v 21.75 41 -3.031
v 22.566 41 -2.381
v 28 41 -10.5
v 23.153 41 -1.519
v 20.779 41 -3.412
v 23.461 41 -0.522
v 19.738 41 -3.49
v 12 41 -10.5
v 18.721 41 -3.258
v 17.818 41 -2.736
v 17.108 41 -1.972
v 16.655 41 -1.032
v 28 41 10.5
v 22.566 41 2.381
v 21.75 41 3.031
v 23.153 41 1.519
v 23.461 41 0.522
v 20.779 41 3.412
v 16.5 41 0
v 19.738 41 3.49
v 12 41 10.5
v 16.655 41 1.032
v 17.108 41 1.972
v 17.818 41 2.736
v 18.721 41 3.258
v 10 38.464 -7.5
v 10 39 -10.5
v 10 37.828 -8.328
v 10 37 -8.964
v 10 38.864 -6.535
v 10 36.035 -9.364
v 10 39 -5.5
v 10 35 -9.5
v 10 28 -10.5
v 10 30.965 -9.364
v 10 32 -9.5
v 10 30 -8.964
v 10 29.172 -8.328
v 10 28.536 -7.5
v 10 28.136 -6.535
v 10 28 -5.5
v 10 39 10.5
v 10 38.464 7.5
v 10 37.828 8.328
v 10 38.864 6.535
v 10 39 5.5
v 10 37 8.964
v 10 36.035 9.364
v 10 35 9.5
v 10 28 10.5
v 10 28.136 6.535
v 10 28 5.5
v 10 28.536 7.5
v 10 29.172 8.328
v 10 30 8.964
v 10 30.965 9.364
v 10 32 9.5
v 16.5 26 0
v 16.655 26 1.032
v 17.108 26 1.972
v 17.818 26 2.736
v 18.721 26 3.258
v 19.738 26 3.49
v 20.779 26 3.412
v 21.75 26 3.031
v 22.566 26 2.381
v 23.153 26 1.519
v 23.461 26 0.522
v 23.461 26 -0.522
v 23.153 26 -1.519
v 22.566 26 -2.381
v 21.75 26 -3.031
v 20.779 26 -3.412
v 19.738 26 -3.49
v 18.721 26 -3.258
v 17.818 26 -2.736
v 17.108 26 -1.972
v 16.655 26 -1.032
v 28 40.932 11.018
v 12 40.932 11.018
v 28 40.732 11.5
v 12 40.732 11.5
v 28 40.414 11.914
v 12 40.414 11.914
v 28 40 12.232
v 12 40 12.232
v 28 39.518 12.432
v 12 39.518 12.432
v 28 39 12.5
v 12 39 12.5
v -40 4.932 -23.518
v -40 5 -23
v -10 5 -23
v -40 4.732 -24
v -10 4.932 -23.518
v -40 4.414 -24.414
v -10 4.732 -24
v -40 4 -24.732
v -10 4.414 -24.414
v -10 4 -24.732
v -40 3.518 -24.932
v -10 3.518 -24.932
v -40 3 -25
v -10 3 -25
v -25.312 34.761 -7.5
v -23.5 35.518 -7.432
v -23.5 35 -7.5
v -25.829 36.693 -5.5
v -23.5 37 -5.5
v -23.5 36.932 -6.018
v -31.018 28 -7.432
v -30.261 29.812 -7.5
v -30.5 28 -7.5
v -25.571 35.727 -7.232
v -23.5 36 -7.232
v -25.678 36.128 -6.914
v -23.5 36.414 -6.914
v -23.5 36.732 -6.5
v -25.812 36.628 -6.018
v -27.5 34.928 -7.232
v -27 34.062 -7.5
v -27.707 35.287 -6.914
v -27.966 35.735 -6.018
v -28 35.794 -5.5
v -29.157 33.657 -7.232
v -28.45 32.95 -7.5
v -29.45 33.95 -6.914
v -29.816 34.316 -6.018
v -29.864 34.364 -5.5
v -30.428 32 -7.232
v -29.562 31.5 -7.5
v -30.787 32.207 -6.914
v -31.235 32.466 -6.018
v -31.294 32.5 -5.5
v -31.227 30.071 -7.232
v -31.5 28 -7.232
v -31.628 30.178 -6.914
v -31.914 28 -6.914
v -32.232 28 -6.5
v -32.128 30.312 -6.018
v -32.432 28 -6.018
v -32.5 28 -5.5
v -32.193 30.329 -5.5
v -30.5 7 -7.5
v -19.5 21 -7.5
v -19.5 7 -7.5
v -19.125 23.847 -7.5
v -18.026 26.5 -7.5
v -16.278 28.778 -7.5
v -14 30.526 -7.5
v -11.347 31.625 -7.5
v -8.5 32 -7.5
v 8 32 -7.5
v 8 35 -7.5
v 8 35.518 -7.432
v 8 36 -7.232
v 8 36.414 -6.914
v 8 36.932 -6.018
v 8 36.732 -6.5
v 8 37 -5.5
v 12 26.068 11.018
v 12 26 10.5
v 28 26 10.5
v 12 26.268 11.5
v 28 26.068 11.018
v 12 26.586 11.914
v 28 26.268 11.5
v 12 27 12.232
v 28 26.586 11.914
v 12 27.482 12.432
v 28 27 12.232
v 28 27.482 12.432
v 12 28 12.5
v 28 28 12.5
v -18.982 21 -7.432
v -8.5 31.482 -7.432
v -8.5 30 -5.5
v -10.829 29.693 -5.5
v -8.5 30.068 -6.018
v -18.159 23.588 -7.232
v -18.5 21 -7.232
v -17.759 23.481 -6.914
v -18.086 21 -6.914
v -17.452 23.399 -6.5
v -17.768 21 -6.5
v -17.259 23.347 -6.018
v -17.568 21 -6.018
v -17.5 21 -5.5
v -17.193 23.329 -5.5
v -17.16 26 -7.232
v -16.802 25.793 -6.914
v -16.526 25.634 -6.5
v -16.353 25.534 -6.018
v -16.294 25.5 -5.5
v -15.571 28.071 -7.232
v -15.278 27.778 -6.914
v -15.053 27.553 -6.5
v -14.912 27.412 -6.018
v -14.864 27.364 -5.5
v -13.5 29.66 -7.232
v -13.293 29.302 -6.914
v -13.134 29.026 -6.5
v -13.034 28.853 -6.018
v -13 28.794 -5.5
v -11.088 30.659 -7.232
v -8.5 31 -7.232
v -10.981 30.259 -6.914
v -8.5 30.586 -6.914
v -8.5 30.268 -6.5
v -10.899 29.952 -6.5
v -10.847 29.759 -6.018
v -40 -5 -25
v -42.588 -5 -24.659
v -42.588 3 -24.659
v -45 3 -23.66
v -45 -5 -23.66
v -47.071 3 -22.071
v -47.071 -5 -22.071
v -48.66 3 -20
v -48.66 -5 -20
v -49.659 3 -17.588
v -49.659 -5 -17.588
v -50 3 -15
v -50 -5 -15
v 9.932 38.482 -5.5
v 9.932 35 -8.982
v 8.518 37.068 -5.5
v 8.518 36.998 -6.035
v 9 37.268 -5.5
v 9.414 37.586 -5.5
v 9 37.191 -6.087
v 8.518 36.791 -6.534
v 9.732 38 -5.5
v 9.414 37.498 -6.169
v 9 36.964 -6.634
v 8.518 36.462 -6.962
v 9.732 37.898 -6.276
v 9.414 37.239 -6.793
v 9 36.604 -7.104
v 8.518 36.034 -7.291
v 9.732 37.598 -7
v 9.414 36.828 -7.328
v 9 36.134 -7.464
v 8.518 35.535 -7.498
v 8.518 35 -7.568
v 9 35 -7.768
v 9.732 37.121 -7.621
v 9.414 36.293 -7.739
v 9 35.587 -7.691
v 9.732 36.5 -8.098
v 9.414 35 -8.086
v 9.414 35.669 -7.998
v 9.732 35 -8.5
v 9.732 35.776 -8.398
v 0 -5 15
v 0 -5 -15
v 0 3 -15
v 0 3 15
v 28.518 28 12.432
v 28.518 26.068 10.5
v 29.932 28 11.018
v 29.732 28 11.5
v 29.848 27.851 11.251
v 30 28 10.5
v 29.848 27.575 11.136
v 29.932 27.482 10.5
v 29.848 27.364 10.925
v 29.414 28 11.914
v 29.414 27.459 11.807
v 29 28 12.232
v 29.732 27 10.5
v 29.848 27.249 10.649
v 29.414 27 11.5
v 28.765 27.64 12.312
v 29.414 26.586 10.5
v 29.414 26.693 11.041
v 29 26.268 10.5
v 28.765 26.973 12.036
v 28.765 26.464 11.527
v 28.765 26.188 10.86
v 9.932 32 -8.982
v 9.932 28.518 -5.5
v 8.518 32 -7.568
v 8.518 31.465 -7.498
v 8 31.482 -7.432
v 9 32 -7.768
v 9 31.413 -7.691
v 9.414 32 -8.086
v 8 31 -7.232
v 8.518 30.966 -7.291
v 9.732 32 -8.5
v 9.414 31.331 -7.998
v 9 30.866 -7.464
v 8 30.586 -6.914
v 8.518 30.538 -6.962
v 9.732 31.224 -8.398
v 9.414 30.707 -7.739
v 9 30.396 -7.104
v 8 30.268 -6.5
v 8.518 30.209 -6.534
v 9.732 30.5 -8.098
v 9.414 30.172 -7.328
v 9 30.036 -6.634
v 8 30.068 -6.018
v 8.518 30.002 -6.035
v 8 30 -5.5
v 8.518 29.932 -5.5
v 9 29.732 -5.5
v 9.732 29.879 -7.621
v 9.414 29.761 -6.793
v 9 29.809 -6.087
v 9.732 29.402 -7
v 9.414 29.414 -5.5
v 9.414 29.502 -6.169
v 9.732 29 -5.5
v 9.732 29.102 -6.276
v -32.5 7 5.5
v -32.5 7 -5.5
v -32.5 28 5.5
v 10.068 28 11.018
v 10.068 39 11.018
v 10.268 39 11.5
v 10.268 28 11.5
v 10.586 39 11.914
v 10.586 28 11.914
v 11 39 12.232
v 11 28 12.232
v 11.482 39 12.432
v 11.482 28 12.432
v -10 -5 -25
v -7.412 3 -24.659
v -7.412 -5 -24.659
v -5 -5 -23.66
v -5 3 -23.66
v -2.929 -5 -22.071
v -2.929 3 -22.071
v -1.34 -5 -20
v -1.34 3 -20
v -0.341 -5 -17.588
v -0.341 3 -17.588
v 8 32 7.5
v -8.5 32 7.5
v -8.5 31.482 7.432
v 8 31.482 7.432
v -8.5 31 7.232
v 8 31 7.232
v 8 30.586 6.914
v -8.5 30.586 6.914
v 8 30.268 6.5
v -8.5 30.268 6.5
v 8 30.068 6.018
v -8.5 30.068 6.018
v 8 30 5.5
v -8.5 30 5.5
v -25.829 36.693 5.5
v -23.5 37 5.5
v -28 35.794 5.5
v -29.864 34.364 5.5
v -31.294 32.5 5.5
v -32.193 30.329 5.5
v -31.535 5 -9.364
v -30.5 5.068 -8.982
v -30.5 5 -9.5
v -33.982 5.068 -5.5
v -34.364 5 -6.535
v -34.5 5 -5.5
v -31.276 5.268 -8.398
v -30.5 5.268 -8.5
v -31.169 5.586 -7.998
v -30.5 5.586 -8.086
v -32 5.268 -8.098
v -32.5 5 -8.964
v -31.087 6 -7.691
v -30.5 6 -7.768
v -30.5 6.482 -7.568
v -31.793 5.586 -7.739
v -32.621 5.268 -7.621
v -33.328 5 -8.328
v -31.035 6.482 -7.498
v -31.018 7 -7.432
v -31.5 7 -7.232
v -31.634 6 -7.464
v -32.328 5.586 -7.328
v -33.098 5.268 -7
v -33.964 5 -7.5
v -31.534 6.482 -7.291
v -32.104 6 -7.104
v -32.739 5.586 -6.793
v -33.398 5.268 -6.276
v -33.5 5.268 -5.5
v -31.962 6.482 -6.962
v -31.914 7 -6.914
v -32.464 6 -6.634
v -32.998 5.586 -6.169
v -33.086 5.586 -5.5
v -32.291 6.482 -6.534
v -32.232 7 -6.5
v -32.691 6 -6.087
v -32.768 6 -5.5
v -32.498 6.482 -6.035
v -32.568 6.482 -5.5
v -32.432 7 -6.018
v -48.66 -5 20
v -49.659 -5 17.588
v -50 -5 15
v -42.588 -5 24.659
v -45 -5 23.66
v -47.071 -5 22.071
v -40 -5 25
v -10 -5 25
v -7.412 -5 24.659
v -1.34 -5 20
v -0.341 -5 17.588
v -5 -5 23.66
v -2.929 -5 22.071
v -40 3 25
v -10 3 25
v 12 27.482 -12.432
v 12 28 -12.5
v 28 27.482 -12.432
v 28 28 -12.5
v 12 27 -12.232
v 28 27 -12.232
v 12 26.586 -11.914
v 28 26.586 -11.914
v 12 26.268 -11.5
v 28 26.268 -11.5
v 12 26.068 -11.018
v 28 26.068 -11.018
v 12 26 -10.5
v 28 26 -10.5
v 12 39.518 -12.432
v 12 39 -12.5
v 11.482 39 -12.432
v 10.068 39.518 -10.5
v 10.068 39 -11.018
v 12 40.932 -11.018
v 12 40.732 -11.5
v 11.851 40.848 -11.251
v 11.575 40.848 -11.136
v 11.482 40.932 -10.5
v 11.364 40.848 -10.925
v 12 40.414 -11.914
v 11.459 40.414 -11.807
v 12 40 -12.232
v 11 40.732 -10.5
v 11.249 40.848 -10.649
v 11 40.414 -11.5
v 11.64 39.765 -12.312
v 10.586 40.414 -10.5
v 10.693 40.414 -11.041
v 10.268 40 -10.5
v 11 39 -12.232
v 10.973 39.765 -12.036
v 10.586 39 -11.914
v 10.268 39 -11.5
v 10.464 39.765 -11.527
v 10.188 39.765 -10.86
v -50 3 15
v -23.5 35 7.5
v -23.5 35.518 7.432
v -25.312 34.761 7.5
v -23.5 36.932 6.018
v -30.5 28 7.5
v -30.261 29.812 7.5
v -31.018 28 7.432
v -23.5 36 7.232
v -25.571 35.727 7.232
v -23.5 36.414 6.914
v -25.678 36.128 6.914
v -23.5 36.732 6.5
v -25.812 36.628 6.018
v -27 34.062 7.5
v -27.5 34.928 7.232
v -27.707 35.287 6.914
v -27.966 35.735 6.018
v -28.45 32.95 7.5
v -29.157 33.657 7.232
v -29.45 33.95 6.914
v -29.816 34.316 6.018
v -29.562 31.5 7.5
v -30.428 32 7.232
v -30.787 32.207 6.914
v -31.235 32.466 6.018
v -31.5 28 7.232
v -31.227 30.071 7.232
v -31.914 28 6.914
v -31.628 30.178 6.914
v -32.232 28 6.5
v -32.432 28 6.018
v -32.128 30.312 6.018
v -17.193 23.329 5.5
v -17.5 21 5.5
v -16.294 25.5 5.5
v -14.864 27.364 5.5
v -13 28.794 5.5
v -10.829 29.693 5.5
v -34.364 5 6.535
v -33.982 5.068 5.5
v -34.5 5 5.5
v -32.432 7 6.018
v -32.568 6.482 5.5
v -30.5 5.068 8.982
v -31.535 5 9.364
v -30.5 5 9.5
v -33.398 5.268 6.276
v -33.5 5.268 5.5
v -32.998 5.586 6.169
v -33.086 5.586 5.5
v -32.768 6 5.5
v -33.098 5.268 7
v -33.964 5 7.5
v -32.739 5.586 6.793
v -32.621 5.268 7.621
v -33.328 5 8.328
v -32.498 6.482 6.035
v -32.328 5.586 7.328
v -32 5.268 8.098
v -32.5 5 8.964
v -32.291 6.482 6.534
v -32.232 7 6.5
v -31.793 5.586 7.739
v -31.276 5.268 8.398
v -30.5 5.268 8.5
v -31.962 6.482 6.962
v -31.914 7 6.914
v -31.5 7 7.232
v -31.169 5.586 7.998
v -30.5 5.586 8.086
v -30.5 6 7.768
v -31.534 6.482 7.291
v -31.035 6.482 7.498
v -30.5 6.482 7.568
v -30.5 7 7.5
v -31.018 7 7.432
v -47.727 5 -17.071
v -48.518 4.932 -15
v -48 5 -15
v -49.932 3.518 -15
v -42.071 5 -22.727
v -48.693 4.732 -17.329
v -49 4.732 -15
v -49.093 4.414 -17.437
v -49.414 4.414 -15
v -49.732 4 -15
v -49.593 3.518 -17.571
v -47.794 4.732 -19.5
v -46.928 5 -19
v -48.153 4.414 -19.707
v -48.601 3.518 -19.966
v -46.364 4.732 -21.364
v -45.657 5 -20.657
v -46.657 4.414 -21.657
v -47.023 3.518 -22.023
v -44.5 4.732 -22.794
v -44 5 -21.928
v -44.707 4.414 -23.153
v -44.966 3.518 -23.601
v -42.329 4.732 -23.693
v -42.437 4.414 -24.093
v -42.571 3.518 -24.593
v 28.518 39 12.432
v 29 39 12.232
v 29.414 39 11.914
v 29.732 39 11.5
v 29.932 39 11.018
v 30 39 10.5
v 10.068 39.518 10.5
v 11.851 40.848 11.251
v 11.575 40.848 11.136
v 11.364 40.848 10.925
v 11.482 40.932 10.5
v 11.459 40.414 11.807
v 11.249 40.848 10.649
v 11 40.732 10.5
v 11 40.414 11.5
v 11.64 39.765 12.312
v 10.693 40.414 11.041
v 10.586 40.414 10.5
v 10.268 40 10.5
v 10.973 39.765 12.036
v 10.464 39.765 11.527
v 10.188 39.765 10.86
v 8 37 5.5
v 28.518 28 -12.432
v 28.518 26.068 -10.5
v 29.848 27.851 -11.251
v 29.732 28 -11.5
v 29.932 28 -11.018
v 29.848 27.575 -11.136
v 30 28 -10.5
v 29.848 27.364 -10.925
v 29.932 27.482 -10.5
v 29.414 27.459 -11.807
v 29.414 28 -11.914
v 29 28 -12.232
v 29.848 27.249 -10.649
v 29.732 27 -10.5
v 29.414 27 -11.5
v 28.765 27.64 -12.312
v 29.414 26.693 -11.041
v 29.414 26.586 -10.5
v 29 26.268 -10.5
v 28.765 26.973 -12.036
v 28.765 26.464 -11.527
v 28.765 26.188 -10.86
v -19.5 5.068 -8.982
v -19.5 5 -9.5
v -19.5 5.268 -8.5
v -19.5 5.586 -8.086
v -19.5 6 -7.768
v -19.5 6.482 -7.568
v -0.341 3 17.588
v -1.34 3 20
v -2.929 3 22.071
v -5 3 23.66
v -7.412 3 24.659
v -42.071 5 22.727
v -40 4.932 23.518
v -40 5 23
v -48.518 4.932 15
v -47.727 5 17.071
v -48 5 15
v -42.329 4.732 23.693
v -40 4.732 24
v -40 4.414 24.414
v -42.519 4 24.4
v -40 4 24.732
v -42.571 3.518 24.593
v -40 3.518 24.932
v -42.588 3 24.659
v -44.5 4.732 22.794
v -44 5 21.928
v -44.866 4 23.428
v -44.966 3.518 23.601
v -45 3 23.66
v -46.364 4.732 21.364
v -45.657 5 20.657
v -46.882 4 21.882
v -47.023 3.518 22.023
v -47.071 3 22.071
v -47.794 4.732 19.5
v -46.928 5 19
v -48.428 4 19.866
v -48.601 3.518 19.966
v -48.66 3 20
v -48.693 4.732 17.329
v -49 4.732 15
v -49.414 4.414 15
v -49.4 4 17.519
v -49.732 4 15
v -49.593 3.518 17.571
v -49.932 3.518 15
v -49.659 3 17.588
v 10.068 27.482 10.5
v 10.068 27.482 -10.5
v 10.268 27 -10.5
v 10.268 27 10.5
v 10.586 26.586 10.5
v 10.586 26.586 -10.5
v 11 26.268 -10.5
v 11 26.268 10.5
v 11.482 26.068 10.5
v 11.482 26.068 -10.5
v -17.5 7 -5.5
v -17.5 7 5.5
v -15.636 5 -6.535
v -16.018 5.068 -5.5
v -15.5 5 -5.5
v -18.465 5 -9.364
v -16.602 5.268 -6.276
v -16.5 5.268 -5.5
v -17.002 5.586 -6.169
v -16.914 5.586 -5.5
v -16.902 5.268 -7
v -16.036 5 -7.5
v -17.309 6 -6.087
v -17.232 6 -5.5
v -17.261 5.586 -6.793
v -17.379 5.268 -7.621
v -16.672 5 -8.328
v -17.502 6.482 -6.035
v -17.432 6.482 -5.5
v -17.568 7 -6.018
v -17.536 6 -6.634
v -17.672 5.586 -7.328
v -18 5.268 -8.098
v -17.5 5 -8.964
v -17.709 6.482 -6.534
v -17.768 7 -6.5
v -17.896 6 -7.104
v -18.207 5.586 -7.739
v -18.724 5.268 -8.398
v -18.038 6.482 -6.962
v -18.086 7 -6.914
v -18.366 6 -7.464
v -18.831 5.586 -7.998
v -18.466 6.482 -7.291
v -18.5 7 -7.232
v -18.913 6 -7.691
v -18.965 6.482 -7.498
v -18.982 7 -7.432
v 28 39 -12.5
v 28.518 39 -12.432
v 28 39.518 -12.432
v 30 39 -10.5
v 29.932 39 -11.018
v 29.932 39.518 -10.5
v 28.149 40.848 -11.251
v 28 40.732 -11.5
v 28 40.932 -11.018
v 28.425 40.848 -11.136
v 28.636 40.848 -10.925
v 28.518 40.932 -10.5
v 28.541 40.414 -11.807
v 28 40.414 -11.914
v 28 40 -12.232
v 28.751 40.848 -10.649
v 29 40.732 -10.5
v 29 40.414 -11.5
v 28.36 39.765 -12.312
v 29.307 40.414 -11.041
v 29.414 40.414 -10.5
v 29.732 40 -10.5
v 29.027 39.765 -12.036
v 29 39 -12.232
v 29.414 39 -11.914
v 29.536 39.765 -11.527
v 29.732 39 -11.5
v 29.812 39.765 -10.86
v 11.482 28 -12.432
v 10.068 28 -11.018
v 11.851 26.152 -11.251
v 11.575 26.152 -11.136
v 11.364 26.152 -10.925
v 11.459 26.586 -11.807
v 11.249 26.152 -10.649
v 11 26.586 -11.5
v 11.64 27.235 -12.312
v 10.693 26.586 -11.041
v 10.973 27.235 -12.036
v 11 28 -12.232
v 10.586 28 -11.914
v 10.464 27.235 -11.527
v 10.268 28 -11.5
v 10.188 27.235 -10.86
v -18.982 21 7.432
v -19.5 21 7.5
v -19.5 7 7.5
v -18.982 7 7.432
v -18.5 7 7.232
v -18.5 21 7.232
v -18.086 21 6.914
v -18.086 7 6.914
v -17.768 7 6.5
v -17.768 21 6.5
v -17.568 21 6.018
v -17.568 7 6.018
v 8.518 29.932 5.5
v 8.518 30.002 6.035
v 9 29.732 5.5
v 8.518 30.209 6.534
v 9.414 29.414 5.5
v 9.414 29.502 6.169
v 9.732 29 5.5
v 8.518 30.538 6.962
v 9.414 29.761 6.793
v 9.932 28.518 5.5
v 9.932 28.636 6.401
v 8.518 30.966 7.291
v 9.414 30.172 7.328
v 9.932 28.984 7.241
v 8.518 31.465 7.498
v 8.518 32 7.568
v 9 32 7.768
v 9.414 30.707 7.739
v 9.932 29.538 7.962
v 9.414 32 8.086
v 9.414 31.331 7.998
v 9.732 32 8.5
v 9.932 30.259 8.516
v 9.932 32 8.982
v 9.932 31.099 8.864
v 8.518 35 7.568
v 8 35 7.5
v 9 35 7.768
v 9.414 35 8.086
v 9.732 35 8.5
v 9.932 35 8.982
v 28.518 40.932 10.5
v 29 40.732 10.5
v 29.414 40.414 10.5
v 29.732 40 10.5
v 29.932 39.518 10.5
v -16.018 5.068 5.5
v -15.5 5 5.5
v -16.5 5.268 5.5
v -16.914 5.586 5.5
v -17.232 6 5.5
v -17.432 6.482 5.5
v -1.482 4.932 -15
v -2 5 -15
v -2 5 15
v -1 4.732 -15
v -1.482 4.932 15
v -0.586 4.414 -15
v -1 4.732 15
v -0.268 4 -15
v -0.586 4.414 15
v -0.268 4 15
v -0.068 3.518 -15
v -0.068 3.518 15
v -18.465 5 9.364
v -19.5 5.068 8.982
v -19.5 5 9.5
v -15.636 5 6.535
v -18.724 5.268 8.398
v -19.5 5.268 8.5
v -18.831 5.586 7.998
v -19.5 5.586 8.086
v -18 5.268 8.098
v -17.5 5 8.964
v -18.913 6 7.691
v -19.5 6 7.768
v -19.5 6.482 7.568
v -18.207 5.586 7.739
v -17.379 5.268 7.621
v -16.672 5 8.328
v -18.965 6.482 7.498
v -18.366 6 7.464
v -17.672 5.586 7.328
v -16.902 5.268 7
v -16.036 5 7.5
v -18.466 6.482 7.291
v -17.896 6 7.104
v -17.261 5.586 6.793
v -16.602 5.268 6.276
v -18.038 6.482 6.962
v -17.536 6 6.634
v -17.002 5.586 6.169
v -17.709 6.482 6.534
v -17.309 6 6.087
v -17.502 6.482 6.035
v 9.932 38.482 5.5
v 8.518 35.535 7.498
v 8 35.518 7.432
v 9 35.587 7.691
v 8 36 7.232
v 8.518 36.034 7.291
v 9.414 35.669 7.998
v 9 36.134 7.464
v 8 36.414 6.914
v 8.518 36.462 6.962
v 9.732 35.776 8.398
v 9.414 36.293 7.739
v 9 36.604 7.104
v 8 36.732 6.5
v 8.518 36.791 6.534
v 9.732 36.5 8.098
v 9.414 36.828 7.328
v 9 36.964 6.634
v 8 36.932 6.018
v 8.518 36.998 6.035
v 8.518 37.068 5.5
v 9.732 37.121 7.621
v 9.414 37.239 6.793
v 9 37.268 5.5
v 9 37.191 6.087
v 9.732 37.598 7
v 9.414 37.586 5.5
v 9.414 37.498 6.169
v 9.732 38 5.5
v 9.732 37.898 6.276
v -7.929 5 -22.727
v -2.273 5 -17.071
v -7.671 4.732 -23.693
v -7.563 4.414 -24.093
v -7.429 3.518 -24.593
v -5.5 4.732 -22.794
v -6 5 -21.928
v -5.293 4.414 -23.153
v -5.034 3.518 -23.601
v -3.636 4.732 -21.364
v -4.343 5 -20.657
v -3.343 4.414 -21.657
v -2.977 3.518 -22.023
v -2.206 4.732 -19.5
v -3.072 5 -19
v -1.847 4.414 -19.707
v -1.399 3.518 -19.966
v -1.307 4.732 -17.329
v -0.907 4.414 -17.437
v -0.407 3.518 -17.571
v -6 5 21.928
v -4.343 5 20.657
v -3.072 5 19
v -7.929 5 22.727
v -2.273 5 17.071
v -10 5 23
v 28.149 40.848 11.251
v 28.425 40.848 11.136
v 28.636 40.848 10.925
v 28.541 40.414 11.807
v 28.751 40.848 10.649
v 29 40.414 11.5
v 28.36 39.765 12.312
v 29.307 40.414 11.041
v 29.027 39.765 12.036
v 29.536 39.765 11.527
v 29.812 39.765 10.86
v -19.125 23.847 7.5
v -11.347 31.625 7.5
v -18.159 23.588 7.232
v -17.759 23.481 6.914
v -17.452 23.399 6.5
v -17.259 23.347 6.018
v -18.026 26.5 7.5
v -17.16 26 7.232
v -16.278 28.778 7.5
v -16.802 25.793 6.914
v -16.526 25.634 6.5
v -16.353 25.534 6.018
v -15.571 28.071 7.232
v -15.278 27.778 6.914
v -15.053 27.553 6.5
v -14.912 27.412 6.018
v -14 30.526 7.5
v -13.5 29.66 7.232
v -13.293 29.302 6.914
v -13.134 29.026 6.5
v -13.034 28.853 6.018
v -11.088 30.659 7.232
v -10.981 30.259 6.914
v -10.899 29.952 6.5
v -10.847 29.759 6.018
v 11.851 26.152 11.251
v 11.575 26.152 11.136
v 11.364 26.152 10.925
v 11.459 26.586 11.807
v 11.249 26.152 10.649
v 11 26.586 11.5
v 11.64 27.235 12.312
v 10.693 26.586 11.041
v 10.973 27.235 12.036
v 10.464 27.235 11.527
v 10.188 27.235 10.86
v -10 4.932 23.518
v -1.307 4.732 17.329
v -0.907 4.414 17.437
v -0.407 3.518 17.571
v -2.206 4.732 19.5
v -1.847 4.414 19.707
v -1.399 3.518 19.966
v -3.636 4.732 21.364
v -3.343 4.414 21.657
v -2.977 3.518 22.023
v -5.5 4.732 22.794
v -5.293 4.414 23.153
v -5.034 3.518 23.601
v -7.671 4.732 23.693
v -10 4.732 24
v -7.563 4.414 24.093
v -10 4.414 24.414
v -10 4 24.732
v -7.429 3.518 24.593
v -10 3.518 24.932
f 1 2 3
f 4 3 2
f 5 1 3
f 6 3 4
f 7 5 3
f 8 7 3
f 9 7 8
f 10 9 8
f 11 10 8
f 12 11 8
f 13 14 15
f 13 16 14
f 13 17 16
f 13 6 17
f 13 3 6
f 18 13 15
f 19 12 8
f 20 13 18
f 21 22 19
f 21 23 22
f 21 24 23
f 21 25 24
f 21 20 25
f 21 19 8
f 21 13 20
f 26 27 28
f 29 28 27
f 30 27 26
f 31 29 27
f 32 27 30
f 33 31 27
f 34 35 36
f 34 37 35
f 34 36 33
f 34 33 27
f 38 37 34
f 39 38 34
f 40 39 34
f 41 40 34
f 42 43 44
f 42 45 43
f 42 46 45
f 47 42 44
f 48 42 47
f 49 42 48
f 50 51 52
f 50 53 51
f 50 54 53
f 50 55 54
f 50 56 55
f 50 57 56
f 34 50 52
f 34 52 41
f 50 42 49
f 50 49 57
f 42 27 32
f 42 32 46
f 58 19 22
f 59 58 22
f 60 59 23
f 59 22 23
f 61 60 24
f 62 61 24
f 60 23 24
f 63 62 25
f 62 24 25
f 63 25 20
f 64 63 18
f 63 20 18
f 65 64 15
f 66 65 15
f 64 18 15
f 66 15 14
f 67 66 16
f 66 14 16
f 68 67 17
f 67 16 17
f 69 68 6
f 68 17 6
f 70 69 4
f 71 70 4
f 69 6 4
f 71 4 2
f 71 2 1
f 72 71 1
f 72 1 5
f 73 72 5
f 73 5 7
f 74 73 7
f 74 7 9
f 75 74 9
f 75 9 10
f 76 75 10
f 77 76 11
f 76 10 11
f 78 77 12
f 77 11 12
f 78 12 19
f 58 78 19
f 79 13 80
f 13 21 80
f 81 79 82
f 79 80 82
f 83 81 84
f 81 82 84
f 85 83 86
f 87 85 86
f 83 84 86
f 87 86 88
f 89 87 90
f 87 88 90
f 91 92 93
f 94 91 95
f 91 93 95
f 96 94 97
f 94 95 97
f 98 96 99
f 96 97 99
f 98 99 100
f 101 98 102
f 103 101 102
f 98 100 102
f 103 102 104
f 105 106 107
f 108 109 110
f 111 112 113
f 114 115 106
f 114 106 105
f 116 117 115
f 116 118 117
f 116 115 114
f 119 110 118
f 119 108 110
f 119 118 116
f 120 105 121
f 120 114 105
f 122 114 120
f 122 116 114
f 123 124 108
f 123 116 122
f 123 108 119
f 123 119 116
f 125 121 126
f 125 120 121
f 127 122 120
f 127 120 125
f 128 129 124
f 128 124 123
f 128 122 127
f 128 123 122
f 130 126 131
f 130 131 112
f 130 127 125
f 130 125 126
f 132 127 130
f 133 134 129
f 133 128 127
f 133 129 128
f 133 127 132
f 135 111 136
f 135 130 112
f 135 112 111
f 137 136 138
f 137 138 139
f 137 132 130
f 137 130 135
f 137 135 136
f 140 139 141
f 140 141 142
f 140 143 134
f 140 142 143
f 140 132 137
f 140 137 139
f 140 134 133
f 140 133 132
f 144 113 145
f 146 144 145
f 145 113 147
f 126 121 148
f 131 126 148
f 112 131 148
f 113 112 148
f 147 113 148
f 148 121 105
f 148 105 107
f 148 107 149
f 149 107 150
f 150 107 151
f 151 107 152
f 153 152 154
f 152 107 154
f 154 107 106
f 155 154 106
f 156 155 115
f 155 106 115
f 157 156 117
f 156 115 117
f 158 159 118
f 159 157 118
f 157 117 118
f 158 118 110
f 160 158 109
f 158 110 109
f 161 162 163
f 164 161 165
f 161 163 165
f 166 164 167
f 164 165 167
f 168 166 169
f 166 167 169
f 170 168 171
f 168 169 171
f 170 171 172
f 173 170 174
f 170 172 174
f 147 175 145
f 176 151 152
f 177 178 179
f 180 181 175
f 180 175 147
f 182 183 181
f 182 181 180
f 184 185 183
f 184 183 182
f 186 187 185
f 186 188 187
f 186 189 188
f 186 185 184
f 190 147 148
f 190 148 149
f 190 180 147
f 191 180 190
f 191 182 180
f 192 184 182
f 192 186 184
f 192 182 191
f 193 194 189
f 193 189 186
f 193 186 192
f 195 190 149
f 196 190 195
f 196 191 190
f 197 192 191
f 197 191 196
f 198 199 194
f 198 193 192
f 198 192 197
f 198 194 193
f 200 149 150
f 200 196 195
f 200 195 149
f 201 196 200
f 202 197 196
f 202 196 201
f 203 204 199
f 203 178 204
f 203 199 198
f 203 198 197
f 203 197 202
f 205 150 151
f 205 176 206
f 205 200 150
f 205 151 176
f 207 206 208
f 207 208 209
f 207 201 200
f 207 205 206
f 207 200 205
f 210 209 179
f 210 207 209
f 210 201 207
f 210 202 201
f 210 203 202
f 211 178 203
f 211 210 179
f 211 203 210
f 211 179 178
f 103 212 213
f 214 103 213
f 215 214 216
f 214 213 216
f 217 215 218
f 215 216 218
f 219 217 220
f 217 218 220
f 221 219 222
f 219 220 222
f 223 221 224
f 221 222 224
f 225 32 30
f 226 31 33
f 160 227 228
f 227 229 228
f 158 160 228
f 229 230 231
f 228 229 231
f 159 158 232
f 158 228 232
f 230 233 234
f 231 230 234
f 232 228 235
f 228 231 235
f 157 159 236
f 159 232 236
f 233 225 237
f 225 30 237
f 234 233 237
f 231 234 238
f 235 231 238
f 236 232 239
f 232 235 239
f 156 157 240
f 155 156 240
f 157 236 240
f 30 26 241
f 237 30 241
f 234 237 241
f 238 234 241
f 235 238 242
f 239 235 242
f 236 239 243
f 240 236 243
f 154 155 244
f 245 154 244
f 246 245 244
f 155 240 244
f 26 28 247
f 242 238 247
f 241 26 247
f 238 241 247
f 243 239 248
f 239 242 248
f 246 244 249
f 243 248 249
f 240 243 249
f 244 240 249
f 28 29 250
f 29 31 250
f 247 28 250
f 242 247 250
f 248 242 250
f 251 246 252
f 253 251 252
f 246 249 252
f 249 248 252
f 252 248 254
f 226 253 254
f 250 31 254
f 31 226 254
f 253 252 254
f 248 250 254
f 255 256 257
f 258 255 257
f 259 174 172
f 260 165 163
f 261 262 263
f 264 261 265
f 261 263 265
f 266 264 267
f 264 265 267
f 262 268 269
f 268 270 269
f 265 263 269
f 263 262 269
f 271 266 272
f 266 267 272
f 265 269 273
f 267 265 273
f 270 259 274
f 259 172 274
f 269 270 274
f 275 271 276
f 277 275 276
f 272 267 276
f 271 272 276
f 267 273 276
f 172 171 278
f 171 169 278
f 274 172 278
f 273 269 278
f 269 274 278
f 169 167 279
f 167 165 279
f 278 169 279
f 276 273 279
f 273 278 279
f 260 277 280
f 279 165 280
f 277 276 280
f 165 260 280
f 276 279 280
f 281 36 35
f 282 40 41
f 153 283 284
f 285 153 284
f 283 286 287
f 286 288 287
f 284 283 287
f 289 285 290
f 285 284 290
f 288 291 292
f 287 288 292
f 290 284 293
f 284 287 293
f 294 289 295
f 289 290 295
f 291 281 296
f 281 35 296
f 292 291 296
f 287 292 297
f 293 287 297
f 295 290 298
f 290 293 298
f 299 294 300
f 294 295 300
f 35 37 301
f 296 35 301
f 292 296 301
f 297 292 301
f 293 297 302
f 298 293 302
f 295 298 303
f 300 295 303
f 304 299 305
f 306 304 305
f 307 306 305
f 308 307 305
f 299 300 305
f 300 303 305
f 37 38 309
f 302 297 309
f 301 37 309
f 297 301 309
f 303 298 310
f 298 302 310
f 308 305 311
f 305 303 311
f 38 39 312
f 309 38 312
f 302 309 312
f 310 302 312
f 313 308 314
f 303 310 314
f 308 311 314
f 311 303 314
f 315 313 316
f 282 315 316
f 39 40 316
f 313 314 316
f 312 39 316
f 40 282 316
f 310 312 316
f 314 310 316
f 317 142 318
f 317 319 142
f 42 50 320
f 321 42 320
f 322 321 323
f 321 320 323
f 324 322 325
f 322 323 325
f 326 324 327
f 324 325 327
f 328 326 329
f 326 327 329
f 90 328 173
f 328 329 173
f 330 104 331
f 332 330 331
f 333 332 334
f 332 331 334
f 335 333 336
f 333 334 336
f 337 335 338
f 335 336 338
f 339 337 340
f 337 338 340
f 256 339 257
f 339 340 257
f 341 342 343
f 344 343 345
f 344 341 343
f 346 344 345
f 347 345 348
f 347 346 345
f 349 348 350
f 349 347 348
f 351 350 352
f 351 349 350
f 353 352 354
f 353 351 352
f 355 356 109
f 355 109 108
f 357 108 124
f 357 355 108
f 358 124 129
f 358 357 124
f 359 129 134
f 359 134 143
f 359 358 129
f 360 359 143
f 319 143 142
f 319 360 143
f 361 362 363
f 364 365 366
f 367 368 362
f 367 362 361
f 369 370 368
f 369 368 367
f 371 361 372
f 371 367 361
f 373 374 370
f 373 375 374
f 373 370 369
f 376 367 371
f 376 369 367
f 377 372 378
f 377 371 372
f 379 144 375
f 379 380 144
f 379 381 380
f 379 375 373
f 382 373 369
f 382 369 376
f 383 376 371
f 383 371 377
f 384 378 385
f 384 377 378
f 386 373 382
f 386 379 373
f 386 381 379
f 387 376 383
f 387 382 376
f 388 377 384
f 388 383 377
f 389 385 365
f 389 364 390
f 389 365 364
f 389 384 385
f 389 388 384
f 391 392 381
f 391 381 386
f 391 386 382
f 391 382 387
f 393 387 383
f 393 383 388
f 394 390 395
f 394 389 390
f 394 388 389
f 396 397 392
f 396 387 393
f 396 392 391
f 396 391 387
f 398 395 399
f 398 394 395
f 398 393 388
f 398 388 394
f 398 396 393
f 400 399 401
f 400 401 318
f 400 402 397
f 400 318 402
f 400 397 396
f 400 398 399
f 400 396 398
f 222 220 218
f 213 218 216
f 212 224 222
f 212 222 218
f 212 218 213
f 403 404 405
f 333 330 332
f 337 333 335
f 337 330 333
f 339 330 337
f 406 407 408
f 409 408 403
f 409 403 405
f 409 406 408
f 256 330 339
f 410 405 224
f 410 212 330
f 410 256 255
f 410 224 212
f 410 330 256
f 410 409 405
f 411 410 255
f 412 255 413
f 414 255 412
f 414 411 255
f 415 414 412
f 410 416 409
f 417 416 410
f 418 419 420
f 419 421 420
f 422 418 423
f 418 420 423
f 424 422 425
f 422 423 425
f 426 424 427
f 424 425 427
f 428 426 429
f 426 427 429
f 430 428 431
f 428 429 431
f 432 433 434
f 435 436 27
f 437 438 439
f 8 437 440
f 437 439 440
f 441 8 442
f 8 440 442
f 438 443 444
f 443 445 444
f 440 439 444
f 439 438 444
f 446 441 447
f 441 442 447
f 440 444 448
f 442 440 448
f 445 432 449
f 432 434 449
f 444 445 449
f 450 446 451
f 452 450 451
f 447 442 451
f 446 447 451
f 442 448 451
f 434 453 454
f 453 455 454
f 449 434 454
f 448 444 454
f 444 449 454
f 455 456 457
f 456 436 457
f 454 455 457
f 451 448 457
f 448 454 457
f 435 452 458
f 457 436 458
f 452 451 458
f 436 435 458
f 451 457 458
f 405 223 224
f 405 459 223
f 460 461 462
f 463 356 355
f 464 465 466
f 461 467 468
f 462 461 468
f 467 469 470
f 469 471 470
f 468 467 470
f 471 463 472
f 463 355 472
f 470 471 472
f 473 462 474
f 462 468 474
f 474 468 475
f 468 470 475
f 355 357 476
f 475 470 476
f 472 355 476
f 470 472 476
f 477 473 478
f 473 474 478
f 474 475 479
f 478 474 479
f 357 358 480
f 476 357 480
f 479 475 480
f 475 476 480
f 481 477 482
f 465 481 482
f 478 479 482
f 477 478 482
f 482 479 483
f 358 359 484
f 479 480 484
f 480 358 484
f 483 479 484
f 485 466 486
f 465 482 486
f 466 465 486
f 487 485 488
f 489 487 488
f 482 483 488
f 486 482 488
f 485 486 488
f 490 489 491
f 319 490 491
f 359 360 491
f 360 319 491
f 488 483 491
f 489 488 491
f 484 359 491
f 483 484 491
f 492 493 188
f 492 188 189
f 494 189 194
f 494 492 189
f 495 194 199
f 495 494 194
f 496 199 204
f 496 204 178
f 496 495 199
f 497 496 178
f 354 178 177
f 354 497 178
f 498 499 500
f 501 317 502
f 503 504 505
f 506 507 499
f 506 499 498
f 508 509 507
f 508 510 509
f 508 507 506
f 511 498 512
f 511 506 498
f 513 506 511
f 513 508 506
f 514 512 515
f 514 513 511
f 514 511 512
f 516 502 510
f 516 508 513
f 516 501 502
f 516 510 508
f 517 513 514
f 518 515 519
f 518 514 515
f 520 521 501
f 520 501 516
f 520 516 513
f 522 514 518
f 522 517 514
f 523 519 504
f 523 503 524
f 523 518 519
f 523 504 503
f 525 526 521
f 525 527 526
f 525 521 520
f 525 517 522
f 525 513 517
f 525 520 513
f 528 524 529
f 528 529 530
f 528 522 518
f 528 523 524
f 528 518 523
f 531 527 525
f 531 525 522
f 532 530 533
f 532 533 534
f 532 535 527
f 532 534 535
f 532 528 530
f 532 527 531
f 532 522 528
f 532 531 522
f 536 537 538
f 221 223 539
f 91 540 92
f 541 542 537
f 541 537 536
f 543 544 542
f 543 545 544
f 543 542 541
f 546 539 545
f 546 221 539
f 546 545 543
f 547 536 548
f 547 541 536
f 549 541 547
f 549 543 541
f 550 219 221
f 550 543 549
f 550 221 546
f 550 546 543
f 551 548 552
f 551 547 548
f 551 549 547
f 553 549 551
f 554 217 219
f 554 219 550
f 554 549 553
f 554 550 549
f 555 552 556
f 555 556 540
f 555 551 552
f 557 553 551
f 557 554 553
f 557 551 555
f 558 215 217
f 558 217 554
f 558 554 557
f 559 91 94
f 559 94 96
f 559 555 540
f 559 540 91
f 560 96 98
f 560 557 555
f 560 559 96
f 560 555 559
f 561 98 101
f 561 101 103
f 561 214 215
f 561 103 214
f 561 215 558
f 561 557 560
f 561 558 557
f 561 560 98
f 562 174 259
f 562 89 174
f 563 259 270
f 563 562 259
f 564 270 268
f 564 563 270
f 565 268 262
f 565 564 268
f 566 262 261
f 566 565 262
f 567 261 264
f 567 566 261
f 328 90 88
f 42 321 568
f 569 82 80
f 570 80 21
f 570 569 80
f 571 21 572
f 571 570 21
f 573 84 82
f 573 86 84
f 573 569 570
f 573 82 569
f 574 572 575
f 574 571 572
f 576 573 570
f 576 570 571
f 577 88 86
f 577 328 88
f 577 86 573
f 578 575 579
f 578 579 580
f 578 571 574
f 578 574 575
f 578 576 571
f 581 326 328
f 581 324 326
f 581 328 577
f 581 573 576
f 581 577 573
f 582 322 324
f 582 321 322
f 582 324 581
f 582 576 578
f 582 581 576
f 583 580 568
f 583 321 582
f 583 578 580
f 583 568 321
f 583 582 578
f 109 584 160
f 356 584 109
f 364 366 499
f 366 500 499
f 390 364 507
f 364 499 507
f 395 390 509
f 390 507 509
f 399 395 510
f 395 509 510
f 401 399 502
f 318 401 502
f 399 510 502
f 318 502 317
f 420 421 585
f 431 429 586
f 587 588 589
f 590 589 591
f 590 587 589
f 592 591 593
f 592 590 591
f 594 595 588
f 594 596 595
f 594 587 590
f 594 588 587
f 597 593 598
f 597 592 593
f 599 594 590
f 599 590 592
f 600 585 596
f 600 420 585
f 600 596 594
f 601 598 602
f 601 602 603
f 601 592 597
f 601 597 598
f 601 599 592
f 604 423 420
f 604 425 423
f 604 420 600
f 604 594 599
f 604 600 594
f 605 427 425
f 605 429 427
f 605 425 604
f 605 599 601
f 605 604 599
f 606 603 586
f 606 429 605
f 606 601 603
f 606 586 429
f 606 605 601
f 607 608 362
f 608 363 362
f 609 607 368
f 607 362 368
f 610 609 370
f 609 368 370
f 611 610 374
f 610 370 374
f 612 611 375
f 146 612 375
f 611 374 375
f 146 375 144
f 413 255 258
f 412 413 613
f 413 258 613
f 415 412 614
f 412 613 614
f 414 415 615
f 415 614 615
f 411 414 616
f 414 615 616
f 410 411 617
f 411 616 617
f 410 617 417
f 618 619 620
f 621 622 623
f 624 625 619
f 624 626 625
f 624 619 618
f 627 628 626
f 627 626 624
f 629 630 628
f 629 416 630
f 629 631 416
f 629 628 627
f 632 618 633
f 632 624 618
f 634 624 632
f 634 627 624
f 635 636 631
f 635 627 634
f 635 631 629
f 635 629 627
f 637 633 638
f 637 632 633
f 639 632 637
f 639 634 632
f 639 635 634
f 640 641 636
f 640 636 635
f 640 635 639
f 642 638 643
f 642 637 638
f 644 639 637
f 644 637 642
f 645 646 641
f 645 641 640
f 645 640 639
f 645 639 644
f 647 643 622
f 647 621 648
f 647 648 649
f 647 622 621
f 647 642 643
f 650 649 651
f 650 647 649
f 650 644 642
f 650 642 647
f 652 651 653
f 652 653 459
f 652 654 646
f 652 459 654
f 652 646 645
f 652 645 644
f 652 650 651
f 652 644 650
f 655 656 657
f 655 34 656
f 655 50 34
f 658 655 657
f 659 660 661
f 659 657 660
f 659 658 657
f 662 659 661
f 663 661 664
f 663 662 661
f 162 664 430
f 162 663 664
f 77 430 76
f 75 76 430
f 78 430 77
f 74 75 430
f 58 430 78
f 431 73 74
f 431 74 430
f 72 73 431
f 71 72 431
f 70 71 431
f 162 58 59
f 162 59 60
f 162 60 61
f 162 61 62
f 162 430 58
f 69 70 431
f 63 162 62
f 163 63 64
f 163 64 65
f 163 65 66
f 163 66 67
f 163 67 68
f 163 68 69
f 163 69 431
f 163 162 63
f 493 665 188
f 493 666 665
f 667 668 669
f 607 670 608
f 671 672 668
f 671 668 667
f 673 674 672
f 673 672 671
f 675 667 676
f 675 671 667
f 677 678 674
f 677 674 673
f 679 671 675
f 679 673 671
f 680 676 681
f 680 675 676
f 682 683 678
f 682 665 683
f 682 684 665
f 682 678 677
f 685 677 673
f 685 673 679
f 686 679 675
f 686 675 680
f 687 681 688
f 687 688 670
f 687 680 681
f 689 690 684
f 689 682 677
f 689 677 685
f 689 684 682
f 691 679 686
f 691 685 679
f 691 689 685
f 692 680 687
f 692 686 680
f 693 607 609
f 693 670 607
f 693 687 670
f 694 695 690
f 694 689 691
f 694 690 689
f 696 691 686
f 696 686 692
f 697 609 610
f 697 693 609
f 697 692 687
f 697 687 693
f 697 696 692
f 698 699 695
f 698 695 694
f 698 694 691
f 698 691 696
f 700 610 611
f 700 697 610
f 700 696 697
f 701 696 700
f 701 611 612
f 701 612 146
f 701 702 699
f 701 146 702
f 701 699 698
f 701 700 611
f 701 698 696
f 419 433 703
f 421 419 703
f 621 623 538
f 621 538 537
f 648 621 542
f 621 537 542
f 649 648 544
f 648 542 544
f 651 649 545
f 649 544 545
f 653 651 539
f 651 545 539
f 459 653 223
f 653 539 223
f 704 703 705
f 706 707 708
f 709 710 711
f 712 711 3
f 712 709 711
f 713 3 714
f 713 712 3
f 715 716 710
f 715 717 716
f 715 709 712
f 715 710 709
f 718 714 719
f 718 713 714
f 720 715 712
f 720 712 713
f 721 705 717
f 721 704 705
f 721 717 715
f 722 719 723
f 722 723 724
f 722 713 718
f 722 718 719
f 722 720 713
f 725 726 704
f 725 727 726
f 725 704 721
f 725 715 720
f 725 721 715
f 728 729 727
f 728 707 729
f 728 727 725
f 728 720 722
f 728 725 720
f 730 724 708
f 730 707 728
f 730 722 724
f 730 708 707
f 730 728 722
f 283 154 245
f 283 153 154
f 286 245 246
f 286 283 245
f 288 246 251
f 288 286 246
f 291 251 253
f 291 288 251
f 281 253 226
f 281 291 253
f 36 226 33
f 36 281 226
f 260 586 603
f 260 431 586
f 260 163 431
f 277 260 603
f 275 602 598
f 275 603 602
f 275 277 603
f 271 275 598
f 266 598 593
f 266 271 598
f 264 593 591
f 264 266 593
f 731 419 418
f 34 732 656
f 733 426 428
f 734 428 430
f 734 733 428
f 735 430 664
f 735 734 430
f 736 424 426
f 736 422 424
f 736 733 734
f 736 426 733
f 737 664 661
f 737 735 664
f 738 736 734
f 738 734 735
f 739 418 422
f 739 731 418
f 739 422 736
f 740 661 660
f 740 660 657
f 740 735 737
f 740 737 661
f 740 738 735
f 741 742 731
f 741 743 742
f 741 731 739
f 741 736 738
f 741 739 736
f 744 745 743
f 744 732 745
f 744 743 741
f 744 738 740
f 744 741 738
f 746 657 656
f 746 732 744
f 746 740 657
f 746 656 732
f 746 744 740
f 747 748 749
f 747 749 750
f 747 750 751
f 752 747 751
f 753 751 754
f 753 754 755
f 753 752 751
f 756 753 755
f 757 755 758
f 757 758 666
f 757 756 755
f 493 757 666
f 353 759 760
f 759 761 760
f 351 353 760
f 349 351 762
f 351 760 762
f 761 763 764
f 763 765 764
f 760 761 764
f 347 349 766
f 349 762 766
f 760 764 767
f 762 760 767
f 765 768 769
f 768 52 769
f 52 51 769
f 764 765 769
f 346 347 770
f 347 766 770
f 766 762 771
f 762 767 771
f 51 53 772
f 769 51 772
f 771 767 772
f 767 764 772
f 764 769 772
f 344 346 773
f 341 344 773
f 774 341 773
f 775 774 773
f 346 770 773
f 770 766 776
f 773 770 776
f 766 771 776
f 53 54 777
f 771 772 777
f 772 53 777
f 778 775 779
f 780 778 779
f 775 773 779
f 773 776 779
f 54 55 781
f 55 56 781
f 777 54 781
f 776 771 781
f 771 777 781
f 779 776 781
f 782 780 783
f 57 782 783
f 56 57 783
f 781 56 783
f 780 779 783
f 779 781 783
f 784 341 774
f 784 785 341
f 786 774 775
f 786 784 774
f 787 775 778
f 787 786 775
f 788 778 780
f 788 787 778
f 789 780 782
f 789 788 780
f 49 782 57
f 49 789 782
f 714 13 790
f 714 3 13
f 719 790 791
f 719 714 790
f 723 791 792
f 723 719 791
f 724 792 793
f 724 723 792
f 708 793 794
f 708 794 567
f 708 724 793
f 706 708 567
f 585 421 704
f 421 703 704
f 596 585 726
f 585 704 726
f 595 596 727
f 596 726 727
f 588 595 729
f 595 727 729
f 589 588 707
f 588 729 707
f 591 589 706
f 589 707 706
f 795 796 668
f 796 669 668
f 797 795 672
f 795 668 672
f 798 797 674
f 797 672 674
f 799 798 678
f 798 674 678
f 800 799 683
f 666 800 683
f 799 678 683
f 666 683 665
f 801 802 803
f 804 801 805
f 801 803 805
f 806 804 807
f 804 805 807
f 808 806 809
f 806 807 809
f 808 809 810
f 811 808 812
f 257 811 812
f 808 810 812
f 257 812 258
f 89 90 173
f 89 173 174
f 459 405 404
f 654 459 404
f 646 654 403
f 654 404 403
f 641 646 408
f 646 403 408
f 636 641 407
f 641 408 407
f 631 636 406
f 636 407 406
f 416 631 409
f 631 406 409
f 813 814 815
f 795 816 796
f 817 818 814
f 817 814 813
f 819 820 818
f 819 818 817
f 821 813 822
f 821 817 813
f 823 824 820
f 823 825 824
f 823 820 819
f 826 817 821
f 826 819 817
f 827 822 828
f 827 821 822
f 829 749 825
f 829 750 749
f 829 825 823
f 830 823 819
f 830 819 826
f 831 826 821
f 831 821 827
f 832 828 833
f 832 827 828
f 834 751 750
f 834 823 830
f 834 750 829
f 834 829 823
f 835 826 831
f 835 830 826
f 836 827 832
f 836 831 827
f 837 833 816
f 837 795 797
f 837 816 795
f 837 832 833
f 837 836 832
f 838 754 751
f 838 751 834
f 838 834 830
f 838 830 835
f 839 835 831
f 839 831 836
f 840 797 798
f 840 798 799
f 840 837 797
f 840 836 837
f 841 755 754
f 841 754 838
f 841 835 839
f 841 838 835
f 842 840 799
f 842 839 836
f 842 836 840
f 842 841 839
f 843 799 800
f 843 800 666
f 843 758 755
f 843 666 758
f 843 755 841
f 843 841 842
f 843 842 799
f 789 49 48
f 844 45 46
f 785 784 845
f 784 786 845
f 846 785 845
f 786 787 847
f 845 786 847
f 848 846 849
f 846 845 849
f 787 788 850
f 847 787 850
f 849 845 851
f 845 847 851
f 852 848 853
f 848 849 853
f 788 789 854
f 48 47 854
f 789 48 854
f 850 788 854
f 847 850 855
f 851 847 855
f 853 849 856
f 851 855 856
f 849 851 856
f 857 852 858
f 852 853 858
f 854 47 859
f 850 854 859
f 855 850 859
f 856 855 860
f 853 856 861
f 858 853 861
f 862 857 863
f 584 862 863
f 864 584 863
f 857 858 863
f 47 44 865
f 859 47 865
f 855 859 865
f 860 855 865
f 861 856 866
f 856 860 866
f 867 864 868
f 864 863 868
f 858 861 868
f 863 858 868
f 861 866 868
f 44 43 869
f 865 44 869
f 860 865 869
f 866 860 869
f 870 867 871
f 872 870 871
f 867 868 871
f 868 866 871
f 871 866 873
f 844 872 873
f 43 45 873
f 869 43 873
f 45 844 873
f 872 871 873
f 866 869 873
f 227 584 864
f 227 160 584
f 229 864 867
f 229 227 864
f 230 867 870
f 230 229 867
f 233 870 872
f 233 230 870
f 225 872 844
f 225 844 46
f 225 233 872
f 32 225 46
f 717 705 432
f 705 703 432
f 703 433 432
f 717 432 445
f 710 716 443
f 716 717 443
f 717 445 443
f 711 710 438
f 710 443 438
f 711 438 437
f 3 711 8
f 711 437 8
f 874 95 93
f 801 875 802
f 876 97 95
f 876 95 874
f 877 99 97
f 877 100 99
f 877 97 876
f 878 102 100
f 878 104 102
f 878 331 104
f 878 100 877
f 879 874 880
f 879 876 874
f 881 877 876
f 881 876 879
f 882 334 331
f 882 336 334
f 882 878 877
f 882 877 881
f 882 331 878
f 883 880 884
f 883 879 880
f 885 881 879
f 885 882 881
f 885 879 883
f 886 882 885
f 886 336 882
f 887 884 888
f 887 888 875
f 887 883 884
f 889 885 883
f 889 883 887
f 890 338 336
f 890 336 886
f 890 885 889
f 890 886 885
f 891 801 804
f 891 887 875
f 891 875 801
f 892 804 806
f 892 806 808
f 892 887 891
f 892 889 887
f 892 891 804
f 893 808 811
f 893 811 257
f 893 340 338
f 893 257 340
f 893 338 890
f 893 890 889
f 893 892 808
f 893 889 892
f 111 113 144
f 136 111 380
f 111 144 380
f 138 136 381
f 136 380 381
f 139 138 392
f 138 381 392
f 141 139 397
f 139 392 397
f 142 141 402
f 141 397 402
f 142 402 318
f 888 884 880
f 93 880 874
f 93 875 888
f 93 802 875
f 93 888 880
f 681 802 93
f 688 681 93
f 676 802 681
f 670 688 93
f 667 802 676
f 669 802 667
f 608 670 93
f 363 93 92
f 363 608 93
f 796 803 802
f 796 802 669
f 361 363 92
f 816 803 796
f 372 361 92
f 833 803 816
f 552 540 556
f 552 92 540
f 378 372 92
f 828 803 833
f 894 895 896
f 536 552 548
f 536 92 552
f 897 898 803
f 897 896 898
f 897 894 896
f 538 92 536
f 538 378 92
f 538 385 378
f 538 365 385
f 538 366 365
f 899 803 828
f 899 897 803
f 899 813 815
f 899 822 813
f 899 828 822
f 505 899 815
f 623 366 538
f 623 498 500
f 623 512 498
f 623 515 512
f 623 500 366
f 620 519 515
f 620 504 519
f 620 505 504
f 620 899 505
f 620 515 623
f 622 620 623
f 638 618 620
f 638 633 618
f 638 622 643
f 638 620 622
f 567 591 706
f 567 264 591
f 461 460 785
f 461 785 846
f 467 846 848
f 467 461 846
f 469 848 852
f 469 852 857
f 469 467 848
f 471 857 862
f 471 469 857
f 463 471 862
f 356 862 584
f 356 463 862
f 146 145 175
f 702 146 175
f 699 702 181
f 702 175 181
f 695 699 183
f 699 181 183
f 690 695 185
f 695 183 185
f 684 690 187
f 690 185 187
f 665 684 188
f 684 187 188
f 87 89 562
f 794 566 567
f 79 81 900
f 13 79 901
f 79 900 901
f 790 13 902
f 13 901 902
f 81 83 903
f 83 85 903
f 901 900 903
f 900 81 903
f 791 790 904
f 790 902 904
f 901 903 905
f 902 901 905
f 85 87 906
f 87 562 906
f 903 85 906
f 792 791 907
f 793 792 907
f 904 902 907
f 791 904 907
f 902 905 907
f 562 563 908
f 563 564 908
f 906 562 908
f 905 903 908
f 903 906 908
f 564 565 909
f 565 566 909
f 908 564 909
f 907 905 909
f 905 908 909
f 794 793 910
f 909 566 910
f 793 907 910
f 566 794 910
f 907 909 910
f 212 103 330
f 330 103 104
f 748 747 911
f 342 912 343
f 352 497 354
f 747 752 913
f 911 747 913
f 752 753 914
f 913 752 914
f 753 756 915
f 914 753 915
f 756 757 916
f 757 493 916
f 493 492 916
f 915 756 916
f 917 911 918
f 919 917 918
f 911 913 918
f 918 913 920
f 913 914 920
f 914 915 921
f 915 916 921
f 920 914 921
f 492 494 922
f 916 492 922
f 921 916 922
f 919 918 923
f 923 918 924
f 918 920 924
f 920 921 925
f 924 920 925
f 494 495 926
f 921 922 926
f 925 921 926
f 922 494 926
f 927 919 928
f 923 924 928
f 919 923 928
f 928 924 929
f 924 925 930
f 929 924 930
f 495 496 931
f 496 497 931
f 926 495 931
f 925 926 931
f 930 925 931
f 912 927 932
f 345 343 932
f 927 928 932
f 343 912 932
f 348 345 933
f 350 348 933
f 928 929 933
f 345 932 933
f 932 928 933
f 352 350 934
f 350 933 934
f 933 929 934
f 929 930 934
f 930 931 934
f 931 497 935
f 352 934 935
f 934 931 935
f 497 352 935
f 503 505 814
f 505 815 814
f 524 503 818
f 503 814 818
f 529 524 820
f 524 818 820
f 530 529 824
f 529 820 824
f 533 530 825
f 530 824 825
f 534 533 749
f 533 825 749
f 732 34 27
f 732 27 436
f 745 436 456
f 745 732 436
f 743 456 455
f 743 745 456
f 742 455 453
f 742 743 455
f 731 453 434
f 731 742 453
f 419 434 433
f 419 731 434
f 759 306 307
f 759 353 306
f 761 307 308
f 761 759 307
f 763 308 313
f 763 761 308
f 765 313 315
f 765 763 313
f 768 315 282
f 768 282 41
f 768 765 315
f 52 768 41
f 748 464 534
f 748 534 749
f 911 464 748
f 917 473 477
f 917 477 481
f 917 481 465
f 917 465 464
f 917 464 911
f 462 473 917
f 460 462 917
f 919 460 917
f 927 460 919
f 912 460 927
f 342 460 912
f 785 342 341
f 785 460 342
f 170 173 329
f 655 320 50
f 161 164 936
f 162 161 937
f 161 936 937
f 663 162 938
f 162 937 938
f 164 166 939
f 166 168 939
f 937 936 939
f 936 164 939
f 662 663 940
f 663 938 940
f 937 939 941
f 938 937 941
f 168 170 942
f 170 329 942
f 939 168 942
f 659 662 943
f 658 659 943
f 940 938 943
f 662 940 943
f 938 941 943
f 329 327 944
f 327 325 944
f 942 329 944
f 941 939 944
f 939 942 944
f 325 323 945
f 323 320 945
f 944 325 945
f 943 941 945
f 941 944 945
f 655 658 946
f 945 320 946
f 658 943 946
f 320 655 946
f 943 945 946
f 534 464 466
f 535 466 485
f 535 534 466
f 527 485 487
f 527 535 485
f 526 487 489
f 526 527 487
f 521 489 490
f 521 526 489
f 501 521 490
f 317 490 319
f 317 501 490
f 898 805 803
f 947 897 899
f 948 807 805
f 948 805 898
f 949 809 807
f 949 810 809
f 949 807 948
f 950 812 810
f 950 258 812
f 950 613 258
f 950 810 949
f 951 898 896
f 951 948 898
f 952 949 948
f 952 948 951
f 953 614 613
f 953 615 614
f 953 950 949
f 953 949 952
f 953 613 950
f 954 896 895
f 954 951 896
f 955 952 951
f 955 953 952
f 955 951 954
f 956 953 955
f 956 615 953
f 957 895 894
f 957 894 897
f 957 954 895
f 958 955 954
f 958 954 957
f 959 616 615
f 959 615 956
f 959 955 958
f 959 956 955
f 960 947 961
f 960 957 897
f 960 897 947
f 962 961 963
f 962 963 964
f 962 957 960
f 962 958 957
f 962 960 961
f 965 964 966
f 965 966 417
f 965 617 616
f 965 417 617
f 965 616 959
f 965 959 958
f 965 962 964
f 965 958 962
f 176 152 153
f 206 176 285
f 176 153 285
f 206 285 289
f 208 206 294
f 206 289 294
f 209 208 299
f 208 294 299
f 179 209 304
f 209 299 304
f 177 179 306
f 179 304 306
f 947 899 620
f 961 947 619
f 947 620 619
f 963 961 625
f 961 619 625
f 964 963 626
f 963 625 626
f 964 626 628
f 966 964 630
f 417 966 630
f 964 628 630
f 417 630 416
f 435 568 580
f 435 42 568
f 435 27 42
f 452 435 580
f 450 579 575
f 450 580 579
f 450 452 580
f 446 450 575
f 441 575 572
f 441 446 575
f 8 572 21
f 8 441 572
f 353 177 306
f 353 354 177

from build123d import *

# Parameters (mm, degrees)
F1_DEPTH = 25
F2_DEPTH = 7.5
F3_DEPTH = 12.5
F4_R     = 10
F5_F1_R  = 2
F5_F2_R  = 2
F6_R     = 3.5
F7_DEPTH = 15
F8_R     = 1.99999


# Not quite as in the source:
# - a fillet or chamfer is up to 0.001 mm smaller than in the source, because OpenCascade refuses the exact size


with BuildPart() as f1:
    # F0 (on Top) → F1 (new body, symmetric)
    with BuildSketch(Plane.XY):
        Polygon((-32.5, 5), (-50, 5), (-50, -5), (0, -5), (0, 5), (-17.5, 5), align=None)
    extrude(amount=F1_DEPTH, both=True)

    # F0 (on Top) → F2 (join, symmetric)
    with BuildSketch(Plane.XY):
        with BuildLine():
            Line((-32.5, 28), (-32.5, 5))
            Line((-32.5, 5), (-17.5, 5))
            Line((-17.5, 5), (-17.5, 21))
            ThreePointArc((-17.5, 21), (-14.8639610307, 27.3639610307), (-8.5, 30))
            Line((-8.5, 30), (10, 30))
            Line((10, 30), (10, 37))
            Line((10, 37), (-23.5, 37))
            ThreePointArc((-23.5, 37), (-29.8639610307, 34.3639610307), (-32.5, 28))
        make_face()
    extrude(amount=F2_DEPTH, both=True)

    # F0 (on Top) → F3 (join, symmetric)
    with BuildSketch(Plane.XY):
        Polygon((10, 41), (10, 37), (10, 30), (10, 26), (30, 26), (30, 41), align=None)
    extrude(amount=F3_DEPTH, both=True)

    # F4
    f4_edges = [f1.edges().sort_by_distance(p)[0] for p in [
        (-50, 0, 25),
        (0, 0, 25),
        (0, 0, -25),
        (-50, 0, -25),
    ]]
    fillet(f4_edges, radius=F4_R)

    # F5: fillet of radius 2 on 26 edges, made by hand

    # F5_f1
    f5_f1_edges = [f1.edges().sort_by_distance(p)[0] for p in [
        (0.75, 30, 7.5),
        (-6.75, 37, 7.5),
        (-29.8639610307, 34.3639610307, 7.5),
        (-32.5, 16.5, 7.5),
        (-17.5, 13, 7.5),
        (-14.8639610307, 27.3639610307, 7.5),
        (0.75, 30, -7.5),
        (-6.75, 37, -7.5),
        (-29.8639610307, 34.3639610307, -7.5),
        (-32.5, 16.5, -7.5),
        (-17.5, 13, -7.5),
        (-14.8639610307, 27.3639610307, -7.5),
        (-50, 5, 0),
        (-47.0710678119, 5, -22.0710678119),
        (-47.0710678119, 5, 22.0710678119),
        (-25, 5, -25),
        (-25, 5, 25),
        (-2.9289321881, 5, -22.0710678119),
        (-2.9289321881, 5, 22.0710678119),
        (0, 5, 0),
    ]]
    fillet(f5_f1_edges, radius=F5_F1_R)

    # F5_f2
    f5_f2_edges = [f1.edges().sort_by_distance(p)[0] for p in [
        (10, 33.5, 7.5),
        (-25, 5, 7.5),
        (10, 33.5, -7.5),
        (-25, 5, -7.5),
        (-17.5, 5, 0),
        (-32.5, 5, 0),
        (-31.9142135624, 5, -6.9142135624),
        (-31.9142135624, 5, 6.9142135624),
        (-18.0857864376, 5, 6.9142135624),
        (-18.0857864376, 5, -6.9142135624),
        (10, 30.5857864376, -6.9142135624),
        (10, 36.4142135624, -6.9142135624),
        (10, 30.5857864376, 6.9142135624),
        (10, 36.4142135624, 6.9142135624),
    ]]
    fillet(f5_f2_edges, radius=F5_F2_R)

    # F6 (on face) → F7 (cut, through all)
    with BuildSketch(Plane(origin=(0, 41, 0), x_dir=(-1, 0, 0), z_dir=(0, 1, 0))):
        with Locations((-20, 0)):
            Circle(F6_R)
    extrude(amount=-F7_DEPTH, mode=Mode.SUBTRACT)

    # F8 (radius 2 in the source; OpenCascade refuses exactly that, so slightly less here)
    f8_edges = [f1.edges().sort_by_distance(p)[0] for p in [
        (10, 33.5, -12.5),
        (20, 26, -12.5),
        (30, 33.5, -12.5),
        (20, 41, -12.5),
        (10, 33.5, 12.5),
        (20, 26, 12.5),
        (30, 33.5, 12.5),
        (20, 41, 12.5),
        (30, 41, 0),
        (30, 26, 0),
        (10, 41, 0),
        (10, 26, 0),
    ]]
    fillet(f8_edges, radius=F8_R)


solid = f1.part
